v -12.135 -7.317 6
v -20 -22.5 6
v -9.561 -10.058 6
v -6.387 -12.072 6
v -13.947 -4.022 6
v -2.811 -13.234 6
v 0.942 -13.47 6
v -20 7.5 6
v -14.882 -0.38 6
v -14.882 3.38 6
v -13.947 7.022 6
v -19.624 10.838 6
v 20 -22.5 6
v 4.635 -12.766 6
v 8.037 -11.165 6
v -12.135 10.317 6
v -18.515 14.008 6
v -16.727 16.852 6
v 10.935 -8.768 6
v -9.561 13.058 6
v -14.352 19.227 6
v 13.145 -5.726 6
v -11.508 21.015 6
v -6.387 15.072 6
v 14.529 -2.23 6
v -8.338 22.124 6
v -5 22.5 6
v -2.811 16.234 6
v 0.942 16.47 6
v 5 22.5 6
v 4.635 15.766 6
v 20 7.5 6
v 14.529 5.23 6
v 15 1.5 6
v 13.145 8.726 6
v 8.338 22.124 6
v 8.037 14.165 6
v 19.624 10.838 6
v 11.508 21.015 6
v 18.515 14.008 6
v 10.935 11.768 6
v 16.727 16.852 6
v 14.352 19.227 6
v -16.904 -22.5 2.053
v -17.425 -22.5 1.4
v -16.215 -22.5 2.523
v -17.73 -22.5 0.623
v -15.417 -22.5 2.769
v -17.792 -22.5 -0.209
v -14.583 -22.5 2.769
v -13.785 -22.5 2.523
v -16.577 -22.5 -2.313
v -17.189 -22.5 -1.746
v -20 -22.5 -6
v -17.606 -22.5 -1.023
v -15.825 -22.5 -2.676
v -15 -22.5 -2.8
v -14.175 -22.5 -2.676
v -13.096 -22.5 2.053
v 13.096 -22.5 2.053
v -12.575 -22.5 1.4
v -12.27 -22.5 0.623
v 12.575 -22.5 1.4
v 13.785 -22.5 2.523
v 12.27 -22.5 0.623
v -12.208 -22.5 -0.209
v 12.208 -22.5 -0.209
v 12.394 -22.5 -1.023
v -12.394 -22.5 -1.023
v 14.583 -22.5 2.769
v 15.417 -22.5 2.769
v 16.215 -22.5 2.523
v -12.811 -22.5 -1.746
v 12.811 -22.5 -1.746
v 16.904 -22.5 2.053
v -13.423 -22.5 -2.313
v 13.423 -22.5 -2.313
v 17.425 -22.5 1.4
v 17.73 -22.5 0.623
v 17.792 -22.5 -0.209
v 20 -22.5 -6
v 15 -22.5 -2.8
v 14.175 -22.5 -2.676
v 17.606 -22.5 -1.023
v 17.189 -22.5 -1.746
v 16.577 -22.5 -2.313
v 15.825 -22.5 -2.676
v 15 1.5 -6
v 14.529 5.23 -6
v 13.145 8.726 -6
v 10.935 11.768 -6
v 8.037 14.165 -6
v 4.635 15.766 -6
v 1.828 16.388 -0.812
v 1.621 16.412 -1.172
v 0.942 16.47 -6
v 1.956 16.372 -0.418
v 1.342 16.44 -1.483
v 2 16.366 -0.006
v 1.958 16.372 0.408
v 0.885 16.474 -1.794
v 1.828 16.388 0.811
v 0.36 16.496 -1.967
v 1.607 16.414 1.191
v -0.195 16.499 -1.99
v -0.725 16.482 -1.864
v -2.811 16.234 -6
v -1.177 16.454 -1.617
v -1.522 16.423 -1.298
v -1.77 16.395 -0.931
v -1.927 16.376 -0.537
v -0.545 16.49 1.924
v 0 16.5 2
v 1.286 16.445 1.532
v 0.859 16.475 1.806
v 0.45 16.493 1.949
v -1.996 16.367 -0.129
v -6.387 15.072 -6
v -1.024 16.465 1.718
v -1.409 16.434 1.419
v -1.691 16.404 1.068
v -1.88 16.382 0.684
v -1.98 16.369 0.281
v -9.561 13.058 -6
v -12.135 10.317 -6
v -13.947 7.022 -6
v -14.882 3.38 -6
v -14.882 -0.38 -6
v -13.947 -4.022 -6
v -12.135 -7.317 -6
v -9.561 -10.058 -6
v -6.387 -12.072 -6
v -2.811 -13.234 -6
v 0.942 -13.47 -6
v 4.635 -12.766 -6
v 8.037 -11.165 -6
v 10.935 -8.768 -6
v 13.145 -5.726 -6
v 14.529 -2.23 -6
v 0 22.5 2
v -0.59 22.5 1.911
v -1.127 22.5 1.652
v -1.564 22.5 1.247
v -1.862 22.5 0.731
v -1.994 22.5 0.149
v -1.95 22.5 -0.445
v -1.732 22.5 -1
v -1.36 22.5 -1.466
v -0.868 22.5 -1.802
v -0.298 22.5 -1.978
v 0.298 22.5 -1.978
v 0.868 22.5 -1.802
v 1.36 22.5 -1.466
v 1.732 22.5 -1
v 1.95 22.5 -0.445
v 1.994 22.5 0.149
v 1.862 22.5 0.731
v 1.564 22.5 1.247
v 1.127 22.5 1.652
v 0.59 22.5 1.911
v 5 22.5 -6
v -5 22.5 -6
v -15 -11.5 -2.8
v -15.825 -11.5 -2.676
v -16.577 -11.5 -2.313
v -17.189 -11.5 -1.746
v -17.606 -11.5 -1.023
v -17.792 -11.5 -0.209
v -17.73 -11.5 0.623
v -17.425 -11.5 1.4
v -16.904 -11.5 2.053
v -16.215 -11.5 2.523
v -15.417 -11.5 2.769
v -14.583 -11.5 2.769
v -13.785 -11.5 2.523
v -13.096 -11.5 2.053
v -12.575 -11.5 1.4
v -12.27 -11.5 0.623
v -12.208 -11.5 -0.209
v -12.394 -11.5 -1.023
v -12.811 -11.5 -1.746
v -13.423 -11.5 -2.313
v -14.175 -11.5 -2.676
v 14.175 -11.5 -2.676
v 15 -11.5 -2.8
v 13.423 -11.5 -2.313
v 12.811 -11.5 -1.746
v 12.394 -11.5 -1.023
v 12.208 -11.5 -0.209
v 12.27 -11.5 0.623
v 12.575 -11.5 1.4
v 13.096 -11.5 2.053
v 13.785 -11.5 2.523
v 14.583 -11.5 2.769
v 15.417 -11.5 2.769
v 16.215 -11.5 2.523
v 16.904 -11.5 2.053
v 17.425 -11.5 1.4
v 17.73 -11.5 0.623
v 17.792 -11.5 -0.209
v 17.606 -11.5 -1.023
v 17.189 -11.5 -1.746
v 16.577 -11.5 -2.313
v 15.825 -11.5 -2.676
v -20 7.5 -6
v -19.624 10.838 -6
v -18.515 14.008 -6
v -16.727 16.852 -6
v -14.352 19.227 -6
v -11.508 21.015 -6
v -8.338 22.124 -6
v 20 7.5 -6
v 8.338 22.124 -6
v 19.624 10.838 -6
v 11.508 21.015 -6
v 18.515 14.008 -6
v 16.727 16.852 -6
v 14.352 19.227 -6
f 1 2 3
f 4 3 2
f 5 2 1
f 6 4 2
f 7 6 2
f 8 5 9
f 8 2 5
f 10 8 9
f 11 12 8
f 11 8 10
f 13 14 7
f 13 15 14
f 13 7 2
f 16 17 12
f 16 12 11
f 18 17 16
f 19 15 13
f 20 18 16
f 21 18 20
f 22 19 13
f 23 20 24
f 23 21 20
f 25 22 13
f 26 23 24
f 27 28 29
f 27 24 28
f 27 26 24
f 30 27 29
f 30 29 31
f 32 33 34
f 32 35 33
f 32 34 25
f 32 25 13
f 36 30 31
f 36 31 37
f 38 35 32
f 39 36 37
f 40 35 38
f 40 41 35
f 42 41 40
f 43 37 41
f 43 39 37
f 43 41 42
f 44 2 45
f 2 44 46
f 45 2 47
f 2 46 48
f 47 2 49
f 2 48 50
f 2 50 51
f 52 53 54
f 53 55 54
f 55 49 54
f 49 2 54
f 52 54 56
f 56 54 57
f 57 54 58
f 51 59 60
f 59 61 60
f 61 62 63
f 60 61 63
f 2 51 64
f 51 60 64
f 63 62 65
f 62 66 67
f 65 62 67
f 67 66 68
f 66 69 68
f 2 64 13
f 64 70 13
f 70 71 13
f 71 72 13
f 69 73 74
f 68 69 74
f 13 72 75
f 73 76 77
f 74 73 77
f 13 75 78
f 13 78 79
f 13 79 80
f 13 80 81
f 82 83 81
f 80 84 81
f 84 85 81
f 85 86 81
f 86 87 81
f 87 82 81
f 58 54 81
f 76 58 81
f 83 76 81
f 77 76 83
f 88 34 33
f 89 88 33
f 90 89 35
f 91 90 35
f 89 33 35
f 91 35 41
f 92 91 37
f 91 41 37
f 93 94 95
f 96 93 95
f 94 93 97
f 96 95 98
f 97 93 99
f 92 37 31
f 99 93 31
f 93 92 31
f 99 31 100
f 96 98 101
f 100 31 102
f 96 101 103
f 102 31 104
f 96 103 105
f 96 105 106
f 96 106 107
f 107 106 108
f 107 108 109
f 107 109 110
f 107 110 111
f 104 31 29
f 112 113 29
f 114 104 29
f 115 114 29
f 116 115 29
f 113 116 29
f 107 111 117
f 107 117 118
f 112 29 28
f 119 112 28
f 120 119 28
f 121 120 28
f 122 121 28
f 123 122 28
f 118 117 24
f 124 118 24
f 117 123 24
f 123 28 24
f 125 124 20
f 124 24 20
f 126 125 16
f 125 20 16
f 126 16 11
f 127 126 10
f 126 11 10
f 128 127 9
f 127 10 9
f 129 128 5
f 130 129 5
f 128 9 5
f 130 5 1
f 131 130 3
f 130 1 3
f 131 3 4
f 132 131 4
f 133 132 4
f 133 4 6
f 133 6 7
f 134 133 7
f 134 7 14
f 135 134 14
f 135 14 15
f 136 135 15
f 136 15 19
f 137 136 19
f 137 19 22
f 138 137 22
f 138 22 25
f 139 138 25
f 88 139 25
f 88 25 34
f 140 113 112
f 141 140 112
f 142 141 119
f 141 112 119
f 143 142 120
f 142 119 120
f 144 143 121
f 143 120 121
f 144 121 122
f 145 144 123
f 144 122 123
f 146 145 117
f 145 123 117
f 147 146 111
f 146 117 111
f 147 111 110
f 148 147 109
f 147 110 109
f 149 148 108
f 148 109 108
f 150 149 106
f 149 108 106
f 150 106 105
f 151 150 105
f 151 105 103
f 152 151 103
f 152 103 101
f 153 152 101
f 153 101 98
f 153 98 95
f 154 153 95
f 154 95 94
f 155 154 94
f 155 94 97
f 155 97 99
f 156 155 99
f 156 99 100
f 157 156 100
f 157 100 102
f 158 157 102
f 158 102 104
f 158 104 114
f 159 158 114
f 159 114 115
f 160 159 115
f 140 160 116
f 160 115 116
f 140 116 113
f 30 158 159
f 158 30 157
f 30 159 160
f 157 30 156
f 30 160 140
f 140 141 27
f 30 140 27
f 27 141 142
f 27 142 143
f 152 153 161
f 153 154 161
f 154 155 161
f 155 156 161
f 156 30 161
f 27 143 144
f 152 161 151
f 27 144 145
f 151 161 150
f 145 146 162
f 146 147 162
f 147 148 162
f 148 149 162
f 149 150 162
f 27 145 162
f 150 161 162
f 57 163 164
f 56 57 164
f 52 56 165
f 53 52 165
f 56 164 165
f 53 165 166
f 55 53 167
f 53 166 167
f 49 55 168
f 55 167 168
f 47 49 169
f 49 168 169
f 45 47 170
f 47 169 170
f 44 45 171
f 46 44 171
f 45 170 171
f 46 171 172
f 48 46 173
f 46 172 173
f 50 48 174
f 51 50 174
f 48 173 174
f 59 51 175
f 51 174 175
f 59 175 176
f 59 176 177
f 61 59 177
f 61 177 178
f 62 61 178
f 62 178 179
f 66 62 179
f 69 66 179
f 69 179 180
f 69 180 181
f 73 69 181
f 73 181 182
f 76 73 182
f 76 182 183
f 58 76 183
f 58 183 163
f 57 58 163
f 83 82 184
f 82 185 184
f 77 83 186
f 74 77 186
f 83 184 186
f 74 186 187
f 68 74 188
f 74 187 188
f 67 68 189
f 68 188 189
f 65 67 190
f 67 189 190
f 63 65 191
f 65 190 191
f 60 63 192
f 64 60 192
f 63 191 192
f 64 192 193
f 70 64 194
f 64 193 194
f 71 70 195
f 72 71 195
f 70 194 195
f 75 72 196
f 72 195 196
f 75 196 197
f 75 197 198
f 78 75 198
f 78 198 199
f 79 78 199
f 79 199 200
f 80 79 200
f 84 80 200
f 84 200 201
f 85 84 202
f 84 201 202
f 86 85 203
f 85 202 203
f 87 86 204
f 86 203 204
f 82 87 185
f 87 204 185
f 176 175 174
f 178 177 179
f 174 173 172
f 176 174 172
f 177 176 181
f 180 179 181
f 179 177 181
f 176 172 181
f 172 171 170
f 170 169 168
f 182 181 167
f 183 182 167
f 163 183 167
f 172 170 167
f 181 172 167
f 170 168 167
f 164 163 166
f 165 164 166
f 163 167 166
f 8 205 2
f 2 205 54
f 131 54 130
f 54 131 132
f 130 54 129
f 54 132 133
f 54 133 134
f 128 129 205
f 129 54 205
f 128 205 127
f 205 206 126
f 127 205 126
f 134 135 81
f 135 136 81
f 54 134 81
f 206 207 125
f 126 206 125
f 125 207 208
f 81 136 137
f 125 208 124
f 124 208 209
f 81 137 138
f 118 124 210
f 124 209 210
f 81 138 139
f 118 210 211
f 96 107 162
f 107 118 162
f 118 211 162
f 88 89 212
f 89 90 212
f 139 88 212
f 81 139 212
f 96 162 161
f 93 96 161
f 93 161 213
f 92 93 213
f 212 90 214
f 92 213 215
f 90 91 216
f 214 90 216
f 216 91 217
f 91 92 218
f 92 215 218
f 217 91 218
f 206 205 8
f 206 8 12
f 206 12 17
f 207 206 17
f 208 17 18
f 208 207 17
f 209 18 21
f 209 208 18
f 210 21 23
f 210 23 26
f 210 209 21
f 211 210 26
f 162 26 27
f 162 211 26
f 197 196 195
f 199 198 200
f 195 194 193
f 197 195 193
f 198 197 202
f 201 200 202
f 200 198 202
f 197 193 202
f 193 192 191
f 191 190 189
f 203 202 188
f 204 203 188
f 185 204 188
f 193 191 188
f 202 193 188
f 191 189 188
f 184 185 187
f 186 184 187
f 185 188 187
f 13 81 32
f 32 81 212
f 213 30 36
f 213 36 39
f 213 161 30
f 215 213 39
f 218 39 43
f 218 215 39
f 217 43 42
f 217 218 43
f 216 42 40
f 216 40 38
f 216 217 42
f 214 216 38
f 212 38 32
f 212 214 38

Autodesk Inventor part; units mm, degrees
ref_plane "YZ Plane" through (0, 0, 0) normal (1, 0, 0) x (0, 1, 0)
ref_plane "XZ Plane" through (0, 0, 0) normal (0, 1, 0) x (-1, 0, 0)
ref_plane "XY Plane" through (0, 0, 0) normal (0, 0, 1) x (1, 0, 0)
sketch "Skizze1" plane through (0, 0, 0) normal (0, 0, 1) x (1, 0, 0)
  line L0 (-20, -22.5) -> (20, -22.5)
  line L1 (20, -22.5) -> (20, 22.5)
  line L2 (20, 22.5) -> (-20, 22.5)
  line L3 (-20, 22.5) -> (-20, -22.5)
  line L4 (-20, -22.5) -> (20, 22.5) construction
  line L5 (20, -22.5) -> (-20, 22.5) construction
  point P0 (0, 0)
  dimension "d0" = 40
  dimension "d1" = 45
extrude "Extrusion1" add sketch "Skizze1" along normal mid plane 12
sketch "Skizze2" plane through (0, 0, 6) normal (0, 0, 1) x (1, 0, 0)
  circle A0 centre (0, 1.5) radius 15
  line L0 (20, 22.5) -> (-20, 22.5) projected
  point P0 (0, 0)
  point P1 (0, 22.5)
  dimension "d4" = 30
  dimension "d5" = 21
extrude "Extrusion2" cut sketch "Skizze2" against normal through all
sketch "Skizze3" plane through (-20, -22.5, 6) normal (0, -1, 0) x (1, 0, 0)
  line L0 (0, -12) -> (0, 0) projected
  line L1 (40, 0) -> (40, -12) projected
  point P0 (20, -6)
  point P1 (5, -6)
  point P2 (35, -6)
  dimension "d8" = 5
  dimension "d9" = 5
hole "Bohrung1" at (-15, -22.5, 0) at (15, -22.5, 0) direction (0, 1, 0) diameter 5.6 depth 11
sketch "Skizze4" plane through (-20, 22.5, 6) normal (0, 1, 0) x (1, 0, 0)
  point P0 (20, 6)
  point P1 (20, 6)
hole "Bohrung2" at (0, 22.5, 0) direction (0, -1, 0) diameter 4 depth 11
fillet "Rundung1" radius 15 2 edges at (-20, 22.5, 0) (20, 22.5, 0)
properties part number "FMR_DXWD80_CPW_Halter_B"
